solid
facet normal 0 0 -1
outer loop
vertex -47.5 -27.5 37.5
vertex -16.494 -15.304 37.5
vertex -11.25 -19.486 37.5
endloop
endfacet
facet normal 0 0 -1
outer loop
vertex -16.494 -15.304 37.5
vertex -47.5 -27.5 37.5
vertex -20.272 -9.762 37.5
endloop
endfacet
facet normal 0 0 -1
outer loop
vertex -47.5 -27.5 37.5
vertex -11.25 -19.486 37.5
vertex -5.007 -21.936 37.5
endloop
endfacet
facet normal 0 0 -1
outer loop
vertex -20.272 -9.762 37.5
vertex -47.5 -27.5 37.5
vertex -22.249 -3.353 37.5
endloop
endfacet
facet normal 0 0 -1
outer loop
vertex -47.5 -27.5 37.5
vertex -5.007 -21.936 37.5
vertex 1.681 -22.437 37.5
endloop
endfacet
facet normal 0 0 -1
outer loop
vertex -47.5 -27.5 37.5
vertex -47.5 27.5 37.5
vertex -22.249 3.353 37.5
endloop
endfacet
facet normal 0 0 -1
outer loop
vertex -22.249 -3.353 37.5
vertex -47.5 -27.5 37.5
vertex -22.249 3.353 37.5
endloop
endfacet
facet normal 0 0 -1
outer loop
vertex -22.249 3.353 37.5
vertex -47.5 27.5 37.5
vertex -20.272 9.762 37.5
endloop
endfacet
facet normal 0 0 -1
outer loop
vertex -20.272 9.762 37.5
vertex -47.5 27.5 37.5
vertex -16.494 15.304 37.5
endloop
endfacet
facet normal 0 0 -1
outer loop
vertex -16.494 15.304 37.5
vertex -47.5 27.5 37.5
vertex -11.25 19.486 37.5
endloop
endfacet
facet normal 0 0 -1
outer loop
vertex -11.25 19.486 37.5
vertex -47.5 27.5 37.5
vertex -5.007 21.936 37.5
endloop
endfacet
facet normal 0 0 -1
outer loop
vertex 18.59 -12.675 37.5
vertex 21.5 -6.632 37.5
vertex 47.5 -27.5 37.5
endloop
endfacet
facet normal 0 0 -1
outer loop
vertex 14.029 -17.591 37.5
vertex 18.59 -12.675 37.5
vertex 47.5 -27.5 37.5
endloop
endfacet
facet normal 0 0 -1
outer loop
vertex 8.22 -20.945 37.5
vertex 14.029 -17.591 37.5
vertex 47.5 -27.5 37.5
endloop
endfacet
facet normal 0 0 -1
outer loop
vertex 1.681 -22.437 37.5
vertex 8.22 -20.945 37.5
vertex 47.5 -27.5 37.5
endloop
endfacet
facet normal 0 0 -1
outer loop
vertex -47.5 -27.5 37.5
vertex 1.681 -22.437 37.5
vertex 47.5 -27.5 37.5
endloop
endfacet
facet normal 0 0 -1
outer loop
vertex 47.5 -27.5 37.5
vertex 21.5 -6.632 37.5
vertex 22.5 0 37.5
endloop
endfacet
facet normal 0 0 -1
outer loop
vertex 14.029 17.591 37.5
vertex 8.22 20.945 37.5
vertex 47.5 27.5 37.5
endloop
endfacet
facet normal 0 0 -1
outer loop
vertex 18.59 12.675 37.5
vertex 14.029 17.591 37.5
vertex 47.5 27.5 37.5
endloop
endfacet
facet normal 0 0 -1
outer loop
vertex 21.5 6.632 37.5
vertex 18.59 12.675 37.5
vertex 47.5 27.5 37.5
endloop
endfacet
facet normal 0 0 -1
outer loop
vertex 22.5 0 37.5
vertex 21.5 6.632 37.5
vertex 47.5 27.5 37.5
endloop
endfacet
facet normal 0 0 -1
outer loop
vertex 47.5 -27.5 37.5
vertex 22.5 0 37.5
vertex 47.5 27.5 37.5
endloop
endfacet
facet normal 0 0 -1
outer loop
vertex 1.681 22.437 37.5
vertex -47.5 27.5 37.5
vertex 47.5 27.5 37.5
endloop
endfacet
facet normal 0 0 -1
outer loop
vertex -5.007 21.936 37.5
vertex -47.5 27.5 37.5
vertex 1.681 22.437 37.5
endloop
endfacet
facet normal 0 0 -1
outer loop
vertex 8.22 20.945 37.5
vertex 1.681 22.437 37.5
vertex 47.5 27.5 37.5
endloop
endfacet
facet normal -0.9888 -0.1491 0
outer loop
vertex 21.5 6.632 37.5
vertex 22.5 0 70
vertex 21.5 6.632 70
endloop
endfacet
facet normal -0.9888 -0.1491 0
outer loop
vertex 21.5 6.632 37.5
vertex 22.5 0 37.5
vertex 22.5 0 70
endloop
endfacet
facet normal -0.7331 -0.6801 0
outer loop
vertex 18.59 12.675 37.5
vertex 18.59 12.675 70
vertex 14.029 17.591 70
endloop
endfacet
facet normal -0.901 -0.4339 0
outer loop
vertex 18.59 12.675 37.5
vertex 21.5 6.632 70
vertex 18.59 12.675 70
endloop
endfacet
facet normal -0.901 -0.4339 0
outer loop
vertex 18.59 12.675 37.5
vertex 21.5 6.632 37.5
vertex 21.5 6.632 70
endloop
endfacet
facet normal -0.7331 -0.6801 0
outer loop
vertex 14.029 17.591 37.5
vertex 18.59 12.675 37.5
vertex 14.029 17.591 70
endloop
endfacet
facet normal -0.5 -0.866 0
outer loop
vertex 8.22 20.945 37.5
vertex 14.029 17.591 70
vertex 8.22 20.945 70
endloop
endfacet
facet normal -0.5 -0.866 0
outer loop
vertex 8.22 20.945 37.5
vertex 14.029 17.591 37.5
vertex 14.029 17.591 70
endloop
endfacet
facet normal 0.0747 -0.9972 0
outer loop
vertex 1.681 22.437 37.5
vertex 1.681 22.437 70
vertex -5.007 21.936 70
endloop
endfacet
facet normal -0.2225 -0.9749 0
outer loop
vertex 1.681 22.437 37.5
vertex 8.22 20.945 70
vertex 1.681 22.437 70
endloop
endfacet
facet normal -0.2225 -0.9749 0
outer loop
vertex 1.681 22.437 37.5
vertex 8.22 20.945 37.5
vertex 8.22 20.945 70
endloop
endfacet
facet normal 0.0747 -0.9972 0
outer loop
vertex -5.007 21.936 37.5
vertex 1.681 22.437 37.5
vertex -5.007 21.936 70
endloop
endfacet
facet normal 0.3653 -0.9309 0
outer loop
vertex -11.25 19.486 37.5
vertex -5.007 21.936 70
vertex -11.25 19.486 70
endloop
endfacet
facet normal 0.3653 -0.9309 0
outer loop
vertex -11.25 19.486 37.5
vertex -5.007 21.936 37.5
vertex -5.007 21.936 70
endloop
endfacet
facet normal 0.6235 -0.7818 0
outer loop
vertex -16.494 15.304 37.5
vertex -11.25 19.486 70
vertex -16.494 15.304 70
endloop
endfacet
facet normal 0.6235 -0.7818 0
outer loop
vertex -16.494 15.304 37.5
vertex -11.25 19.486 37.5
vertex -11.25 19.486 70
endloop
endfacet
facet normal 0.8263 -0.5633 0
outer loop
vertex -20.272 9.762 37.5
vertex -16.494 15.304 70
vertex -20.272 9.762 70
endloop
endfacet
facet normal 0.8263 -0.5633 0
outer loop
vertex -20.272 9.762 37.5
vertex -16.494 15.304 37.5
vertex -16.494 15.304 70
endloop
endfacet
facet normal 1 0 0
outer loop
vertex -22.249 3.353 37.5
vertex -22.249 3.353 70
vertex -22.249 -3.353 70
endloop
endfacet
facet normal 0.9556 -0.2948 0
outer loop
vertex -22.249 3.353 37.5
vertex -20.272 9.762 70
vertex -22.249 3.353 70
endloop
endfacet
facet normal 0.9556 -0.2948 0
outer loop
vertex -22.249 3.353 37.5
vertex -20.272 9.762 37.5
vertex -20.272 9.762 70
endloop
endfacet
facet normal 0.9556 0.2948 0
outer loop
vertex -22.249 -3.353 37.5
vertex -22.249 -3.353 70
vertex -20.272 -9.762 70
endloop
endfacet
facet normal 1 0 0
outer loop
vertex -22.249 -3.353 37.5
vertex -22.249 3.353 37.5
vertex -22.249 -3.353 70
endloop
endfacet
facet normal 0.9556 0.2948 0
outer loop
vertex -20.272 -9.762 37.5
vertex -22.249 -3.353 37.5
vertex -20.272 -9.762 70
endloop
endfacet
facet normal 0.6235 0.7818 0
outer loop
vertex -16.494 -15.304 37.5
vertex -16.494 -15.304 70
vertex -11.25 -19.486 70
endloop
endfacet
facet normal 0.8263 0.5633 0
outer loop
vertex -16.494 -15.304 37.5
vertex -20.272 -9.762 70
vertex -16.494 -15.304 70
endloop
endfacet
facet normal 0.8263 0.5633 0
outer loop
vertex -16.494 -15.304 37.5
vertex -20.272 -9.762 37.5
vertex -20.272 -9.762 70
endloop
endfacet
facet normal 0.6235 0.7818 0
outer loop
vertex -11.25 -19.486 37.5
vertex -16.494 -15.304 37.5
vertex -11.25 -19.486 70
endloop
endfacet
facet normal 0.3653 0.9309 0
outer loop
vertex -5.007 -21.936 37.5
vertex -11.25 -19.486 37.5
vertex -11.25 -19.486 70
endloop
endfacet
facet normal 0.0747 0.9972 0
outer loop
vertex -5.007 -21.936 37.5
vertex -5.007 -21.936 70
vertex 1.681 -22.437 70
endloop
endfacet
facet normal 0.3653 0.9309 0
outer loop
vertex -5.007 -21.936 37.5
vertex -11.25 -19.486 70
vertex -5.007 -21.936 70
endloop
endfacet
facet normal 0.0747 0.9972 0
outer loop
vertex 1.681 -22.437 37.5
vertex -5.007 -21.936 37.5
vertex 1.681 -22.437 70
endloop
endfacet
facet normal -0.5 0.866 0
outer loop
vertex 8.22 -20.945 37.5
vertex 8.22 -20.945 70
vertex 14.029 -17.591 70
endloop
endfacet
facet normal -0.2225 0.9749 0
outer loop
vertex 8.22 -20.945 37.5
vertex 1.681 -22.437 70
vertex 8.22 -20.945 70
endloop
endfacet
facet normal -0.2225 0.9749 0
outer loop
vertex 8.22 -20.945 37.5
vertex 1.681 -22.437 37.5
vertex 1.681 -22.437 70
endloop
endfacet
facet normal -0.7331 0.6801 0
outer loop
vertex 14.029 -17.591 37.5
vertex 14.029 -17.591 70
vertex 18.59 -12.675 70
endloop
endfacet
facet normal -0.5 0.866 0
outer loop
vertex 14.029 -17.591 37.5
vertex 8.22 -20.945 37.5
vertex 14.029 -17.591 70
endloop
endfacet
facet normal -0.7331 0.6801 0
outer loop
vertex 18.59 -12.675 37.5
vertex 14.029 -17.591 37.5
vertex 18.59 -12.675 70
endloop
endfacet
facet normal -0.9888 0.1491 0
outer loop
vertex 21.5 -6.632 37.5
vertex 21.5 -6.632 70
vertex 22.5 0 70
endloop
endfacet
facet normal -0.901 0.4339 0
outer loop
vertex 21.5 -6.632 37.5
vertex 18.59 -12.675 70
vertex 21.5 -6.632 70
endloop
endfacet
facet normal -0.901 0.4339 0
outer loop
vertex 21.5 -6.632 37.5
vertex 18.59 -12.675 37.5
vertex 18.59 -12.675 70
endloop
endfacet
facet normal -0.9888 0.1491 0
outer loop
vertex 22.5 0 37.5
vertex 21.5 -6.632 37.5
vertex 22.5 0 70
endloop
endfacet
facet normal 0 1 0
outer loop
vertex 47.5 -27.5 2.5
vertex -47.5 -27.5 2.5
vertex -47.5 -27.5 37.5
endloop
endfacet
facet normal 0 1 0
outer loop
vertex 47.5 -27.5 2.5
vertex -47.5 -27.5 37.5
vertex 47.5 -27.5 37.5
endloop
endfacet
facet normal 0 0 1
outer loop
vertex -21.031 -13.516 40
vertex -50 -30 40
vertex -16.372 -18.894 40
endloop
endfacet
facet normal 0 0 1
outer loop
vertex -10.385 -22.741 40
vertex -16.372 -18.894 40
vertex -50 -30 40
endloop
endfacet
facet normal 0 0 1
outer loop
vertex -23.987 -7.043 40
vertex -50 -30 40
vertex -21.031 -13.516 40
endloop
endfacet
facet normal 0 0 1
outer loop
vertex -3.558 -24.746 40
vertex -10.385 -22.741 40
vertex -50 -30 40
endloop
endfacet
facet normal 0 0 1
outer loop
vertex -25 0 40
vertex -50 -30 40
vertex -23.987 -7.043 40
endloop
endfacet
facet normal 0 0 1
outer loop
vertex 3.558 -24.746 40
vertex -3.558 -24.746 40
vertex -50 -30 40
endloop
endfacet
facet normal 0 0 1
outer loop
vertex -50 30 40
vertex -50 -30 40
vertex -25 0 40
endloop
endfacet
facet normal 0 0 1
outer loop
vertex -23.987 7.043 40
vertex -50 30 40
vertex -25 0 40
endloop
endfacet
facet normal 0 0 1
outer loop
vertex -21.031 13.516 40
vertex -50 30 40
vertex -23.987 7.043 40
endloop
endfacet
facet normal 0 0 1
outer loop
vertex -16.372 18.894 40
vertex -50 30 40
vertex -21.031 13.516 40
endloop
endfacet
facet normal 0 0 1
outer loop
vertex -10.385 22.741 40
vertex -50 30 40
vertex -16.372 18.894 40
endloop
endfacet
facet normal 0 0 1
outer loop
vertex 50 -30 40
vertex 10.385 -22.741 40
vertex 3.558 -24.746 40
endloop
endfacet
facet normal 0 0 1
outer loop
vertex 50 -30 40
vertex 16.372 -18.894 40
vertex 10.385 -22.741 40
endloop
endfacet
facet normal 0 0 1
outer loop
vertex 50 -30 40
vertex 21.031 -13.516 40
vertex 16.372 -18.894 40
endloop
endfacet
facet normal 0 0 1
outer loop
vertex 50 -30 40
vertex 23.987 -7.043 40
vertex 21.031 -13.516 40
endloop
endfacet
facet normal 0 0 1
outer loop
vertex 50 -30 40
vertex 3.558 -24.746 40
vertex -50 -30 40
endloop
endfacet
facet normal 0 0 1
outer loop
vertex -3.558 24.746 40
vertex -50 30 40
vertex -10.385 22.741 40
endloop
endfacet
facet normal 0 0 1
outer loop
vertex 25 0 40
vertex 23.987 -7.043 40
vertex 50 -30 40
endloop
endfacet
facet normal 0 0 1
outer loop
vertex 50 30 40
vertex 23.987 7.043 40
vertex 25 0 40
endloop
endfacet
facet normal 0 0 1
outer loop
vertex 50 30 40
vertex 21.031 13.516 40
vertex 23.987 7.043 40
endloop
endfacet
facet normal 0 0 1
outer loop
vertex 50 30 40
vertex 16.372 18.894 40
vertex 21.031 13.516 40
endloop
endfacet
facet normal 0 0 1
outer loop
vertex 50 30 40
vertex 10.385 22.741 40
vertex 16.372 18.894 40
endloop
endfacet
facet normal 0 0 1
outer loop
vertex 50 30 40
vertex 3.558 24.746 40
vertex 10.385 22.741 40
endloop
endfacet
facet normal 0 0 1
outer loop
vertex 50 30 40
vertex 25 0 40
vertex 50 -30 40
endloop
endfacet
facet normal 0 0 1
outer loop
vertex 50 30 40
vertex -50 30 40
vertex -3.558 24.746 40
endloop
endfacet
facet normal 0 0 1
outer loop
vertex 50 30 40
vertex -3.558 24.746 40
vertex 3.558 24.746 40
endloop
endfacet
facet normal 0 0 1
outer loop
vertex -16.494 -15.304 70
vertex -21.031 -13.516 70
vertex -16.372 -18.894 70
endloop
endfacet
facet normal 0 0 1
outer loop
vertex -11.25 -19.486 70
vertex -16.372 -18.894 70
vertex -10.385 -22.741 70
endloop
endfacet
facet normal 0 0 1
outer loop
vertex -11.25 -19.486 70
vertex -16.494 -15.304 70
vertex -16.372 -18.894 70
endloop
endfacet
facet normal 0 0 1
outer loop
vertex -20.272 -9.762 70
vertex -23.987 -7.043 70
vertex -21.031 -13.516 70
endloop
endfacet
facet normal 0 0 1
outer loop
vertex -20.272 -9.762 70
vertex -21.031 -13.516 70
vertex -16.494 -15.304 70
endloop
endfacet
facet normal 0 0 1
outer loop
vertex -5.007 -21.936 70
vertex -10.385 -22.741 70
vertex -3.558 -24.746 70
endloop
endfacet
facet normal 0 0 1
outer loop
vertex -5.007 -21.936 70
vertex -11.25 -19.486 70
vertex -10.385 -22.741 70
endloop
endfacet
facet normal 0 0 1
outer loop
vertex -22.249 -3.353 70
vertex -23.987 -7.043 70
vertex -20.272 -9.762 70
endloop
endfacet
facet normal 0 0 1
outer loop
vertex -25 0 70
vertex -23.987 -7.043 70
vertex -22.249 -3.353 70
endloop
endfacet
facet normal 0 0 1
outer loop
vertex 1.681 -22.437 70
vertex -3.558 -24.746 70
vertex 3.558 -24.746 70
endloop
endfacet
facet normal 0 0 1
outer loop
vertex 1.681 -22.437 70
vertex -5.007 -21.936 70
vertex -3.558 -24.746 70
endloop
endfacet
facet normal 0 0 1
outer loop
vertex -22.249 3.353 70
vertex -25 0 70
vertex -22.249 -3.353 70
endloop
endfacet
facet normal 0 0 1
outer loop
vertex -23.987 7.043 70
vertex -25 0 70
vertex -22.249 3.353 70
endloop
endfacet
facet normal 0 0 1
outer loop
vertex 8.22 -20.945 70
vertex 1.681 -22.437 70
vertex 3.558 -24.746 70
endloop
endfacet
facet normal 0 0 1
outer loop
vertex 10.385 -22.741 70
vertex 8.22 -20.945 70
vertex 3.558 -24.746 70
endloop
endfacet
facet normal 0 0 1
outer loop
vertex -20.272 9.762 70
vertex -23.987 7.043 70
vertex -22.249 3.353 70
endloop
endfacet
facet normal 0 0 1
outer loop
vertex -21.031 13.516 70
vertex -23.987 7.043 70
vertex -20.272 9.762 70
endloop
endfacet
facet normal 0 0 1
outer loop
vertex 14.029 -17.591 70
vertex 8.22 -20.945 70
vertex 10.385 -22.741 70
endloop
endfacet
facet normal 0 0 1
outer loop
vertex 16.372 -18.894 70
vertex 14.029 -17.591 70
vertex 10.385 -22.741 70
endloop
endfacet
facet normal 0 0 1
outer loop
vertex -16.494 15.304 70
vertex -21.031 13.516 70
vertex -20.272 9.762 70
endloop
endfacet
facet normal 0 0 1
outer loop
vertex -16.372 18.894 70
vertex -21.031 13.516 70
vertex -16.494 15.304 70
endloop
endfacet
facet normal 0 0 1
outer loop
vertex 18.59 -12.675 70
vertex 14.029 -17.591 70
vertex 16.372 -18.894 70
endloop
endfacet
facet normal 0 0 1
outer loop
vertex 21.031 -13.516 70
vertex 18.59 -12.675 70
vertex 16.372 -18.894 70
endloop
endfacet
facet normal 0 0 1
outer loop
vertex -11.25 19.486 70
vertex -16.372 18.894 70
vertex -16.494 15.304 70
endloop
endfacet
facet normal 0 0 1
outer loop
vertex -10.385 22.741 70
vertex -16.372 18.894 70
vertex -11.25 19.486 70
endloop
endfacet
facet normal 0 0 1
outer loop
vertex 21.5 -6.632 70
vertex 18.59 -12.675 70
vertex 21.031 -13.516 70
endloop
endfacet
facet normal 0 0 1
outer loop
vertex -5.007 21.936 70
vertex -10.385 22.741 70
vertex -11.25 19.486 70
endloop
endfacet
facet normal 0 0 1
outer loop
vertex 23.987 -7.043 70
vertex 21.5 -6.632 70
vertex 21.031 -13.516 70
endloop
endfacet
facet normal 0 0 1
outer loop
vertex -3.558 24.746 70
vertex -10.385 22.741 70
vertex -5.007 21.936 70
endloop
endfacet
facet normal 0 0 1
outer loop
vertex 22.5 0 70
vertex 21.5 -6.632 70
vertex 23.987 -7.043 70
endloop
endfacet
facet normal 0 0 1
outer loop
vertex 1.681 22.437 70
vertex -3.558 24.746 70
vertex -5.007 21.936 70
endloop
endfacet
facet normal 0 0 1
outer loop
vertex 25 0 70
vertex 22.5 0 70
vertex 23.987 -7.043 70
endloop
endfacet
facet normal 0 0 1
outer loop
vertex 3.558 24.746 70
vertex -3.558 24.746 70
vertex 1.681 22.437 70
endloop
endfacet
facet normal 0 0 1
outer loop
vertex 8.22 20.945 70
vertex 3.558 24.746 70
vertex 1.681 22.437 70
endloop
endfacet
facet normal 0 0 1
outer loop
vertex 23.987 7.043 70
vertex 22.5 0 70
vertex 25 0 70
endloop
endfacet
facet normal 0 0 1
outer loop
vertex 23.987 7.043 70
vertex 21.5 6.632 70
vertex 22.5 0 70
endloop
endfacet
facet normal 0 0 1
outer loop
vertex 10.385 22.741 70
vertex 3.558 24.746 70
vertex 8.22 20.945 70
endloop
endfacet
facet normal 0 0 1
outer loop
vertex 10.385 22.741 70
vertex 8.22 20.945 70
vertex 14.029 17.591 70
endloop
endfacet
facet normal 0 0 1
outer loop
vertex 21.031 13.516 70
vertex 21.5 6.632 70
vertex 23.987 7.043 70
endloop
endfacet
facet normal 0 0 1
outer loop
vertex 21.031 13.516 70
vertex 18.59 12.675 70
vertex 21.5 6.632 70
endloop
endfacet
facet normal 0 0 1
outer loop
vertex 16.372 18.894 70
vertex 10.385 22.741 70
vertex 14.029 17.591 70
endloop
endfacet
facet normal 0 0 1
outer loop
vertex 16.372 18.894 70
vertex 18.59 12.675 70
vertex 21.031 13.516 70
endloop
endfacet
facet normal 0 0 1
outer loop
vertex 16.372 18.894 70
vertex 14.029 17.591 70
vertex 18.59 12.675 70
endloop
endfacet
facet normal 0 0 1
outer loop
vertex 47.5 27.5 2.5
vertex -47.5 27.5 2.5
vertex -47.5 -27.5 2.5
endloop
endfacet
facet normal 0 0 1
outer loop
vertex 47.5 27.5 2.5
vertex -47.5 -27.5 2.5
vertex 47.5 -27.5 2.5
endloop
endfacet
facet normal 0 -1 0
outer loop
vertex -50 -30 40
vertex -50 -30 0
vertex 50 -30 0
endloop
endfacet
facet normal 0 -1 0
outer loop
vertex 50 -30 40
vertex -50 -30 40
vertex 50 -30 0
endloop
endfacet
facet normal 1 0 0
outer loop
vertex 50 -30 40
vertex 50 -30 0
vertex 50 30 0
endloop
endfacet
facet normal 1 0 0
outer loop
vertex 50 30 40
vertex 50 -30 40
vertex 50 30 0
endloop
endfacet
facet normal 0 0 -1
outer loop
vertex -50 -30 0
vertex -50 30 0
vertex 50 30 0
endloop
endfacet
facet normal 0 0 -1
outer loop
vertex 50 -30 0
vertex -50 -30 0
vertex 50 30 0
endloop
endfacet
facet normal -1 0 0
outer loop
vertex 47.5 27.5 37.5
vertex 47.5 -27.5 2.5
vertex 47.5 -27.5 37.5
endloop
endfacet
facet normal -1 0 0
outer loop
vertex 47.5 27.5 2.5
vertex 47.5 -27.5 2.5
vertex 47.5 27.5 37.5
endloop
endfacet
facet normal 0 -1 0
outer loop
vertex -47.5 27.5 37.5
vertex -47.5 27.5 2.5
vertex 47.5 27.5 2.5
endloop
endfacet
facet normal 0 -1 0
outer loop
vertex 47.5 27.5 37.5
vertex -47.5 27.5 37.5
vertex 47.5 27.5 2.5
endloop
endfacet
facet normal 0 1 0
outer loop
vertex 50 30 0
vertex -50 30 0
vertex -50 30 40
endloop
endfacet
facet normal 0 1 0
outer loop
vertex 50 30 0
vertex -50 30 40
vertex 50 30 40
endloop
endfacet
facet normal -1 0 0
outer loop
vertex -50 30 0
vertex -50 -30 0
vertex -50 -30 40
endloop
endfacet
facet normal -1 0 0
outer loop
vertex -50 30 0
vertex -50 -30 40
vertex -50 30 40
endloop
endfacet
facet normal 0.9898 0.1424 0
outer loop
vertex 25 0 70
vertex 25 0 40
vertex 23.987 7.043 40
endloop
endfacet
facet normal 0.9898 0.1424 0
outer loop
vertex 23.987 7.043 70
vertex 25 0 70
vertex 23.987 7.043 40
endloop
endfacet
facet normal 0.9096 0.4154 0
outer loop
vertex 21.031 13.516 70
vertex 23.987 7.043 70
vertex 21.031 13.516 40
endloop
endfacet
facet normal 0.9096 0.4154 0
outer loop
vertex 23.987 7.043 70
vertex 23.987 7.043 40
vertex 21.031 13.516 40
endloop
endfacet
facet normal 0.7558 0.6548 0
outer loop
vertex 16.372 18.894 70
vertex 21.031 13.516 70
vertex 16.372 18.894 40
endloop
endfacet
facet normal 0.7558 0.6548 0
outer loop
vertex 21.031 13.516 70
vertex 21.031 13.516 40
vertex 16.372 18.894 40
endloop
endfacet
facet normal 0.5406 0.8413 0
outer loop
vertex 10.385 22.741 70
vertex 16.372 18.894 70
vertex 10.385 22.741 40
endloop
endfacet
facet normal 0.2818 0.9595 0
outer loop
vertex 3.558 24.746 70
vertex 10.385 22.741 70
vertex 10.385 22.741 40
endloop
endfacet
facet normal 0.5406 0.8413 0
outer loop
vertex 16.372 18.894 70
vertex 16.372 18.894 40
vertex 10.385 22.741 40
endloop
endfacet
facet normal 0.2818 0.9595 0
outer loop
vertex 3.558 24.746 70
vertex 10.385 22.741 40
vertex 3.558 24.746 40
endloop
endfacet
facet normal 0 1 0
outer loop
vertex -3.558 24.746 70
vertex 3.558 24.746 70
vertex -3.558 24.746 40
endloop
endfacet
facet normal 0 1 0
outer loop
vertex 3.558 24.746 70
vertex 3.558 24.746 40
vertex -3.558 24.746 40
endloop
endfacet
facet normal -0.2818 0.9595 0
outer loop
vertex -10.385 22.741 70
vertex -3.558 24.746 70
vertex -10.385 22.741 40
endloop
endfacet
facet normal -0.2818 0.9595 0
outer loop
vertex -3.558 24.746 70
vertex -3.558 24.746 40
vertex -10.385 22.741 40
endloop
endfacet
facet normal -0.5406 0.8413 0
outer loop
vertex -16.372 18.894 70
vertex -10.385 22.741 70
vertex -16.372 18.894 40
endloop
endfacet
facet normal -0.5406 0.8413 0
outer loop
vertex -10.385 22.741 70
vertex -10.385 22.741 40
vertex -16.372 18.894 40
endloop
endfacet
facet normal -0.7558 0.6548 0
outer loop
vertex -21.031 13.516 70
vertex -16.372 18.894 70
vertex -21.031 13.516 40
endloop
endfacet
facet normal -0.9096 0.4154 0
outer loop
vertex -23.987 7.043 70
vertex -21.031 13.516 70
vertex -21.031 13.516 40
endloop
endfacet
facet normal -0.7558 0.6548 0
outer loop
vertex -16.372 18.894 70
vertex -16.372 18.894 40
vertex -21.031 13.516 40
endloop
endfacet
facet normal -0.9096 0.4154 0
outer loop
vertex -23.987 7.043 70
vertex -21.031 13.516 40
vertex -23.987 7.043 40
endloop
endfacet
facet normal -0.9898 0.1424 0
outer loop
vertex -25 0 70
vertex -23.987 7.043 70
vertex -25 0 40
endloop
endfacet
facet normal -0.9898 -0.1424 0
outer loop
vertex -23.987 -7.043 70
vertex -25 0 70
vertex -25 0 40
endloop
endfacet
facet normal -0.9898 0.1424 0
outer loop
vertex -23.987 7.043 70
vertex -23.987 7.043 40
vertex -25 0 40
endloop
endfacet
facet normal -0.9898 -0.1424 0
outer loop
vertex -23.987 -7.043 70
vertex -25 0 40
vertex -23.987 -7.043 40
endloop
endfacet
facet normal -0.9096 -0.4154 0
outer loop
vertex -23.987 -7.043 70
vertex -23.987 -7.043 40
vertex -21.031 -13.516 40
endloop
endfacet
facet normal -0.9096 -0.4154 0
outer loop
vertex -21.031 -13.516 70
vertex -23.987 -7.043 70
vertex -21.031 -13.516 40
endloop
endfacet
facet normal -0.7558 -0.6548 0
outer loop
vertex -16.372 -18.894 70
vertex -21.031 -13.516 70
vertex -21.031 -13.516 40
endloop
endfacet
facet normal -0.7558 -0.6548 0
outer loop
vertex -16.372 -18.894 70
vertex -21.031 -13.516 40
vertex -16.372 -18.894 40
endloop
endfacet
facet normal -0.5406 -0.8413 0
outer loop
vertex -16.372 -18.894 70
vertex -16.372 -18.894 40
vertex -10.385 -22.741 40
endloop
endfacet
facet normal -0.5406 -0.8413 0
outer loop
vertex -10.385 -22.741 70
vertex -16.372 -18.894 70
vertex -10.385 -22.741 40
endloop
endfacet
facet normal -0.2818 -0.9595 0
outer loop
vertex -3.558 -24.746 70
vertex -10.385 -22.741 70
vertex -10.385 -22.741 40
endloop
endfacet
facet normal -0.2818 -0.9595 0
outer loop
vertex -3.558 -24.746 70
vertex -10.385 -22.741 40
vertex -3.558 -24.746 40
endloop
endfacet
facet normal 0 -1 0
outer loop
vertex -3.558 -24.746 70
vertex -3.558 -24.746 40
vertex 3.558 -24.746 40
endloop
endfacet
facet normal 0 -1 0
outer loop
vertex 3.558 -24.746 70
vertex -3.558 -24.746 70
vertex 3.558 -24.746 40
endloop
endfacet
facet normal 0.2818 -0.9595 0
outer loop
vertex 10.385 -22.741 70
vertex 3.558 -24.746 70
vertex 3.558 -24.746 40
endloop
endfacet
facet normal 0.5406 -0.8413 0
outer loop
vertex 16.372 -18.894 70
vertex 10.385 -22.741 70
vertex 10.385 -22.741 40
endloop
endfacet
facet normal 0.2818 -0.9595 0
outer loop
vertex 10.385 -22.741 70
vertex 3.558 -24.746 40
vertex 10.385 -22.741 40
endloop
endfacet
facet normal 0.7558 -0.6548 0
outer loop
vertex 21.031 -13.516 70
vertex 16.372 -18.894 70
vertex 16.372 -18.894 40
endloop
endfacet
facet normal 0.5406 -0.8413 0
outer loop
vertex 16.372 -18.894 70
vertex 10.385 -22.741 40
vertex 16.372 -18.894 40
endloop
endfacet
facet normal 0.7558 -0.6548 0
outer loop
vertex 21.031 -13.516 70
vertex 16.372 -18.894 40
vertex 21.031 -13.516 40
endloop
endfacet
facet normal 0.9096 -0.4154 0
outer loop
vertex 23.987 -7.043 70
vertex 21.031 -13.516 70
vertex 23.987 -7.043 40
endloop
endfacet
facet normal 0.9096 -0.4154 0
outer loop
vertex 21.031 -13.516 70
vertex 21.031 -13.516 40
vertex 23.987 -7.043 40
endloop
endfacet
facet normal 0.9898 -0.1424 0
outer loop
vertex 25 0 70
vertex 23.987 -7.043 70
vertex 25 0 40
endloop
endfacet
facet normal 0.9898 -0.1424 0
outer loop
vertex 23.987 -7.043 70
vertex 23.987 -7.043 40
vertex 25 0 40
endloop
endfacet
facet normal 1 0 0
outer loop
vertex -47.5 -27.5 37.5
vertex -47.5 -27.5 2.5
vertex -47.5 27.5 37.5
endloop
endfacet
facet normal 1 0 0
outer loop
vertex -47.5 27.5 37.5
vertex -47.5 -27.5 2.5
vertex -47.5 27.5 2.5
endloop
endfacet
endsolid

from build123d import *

# Parameters (mm, degrees)
F0_W     = 100
F0_H     = 60
F1_DEPTH = 40
F2_R     = 25
F3_DEPTH = 30
F4_T     = -2.5


with BuildPart() as f1:
    # F0 (on Top) → F1 (new body)
    with BuildSketch(Plane.XY):
        Rectangle(F0_W, F0_H)
    extrude(amount=F1_DEPTH)

    # F2 (on face) → F3 (join)
    with BuildSketch(Plane.XY.offset(40)):
        Circle(F2_R)
    extrude(amount=F3_DEPTH)

    # F4
    f4_openings = [f1.faces().sort_by_distance(p)[0] for p in [
        (0, 0, 70),
    ]]
    offset(amount=F4_T, openings=f4_openings, kind=Kind.INTERSECTION)


solid = f1.part
